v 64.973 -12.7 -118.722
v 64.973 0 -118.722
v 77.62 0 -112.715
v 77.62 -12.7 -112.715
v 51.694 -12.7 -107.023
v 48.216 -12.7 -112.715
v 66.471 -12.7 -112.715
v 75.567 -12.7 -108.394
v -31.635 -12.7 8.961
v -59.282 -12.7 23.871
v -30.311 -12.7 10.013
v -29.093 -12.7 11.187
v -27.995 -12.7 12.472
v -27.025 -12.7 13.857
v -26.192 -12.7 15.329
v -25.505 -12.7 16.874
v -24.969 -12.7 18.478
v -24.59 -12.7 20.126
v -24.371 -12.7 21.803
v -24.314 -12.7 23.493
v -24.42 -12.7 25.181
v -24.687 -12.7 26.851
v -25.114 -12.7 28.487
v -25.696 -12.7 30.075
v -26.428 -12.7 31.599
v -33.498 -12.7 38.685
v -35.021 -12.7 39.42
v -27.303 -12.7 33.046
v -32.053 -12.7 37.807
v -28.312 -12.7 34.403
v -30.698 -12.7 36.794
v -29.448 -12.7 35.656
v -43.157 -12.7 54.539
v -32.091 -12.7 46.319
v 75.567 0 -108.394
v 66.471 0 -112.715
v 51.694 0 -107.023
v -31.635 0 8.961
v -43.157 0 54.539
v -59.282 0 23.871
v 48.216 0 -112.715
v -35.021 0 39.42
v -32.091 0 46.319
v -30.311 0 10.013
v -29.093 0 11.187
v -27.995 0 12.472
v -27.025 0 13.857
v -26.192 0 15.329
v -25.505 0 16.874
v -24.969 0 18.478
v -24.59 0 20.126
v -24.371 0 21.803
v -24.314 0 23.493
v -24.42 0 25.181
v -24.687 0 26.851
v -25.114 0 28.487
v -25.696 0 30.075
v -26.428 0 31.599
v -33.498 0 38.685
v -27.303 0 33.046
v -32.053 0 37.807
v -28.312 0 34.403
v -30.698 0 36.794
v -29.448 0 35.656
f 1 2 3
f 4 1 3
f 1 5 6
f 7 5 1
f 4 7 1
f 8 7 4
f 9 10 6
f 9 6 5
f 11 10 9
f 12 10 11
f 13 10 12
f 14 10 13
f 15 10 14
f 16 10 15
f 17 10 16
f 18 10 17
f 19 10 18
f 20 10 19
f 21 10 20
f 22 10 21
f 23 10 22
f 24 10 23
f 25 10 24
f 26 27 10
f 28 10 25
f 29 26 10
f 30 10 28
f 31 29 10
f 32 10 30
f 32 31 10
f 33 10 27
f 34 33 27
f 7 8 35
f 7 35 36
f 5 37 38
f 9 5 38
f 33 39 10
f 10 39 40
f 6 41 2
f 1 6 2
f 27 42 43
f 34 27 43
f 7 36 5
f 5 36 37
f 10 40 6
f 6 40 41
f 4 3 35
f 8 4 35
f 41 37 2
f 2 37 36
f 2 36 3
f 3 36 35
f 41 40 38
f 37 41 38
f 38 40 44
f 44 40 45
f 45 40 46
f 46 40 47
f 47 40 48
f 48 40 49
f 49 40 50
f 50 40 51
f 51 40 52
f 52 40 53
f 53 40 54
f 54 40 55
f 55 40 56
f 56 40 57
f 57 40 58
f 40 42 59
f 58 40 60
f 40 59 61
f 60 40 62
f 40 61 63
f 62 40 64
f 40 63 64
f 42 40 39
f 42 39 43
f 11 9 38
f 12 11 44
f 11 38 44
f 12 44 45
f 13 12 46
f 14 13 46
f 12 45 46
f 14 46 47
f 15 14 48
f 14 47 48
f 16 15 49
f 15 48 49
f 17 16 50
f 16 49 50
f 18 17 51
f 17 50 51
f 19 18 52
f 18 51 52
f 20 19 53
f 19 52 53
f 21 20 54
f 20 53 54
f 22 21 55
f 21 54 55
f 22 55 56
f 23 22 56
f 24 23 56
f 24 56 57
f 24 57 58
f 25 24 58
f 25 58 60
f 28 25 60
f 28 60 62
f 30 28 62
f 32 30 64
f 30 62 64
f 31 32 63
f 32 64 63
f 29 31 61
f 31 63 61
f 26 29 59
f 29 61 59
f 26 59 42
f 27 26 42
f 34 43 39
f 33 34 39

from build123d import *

# Parameters (mm, degrees)
F1_DEPTH = 12.7


with BuildPart() as f1:
    # F0 (on Front) → F1 (new body)
    with BuildSketch(Plane.XZ):
        with BuildLine():
            Line((-32.091238, 46.31887), (-43.157175, 54.539282))
            Line((-43.157175, 54.539282), (-59.281833, 23.870818))
            Line((-59.281833, 23.870818), (48.215881, -112.714514))
            Line((48.215881, -112.714514), (64.972878, -118.721738))
            Line((64.972878, -118.721738), (77.619664, -112.714514))
            Line((77.619664, -112.714514), (75.567222, -108.393584))
            Line((75.567222, -108.393584), (66.470528, -112.714514))
            Line((66.470528, -112.714514), (51.693749, -107.023455))
            Line((51.693749, -107.023455), (-31.634918, 8.961036))
            ThreePointArc((-31.634918, 8.961036), (-24.419928, 25.180798), (-35.020864, 39.420072))
            Line((-35.020864, 39.420072), (-32.091238, 46.31887))
        make_face()
    extrude(amount=F1_DEPTH)


solid = f1.part
